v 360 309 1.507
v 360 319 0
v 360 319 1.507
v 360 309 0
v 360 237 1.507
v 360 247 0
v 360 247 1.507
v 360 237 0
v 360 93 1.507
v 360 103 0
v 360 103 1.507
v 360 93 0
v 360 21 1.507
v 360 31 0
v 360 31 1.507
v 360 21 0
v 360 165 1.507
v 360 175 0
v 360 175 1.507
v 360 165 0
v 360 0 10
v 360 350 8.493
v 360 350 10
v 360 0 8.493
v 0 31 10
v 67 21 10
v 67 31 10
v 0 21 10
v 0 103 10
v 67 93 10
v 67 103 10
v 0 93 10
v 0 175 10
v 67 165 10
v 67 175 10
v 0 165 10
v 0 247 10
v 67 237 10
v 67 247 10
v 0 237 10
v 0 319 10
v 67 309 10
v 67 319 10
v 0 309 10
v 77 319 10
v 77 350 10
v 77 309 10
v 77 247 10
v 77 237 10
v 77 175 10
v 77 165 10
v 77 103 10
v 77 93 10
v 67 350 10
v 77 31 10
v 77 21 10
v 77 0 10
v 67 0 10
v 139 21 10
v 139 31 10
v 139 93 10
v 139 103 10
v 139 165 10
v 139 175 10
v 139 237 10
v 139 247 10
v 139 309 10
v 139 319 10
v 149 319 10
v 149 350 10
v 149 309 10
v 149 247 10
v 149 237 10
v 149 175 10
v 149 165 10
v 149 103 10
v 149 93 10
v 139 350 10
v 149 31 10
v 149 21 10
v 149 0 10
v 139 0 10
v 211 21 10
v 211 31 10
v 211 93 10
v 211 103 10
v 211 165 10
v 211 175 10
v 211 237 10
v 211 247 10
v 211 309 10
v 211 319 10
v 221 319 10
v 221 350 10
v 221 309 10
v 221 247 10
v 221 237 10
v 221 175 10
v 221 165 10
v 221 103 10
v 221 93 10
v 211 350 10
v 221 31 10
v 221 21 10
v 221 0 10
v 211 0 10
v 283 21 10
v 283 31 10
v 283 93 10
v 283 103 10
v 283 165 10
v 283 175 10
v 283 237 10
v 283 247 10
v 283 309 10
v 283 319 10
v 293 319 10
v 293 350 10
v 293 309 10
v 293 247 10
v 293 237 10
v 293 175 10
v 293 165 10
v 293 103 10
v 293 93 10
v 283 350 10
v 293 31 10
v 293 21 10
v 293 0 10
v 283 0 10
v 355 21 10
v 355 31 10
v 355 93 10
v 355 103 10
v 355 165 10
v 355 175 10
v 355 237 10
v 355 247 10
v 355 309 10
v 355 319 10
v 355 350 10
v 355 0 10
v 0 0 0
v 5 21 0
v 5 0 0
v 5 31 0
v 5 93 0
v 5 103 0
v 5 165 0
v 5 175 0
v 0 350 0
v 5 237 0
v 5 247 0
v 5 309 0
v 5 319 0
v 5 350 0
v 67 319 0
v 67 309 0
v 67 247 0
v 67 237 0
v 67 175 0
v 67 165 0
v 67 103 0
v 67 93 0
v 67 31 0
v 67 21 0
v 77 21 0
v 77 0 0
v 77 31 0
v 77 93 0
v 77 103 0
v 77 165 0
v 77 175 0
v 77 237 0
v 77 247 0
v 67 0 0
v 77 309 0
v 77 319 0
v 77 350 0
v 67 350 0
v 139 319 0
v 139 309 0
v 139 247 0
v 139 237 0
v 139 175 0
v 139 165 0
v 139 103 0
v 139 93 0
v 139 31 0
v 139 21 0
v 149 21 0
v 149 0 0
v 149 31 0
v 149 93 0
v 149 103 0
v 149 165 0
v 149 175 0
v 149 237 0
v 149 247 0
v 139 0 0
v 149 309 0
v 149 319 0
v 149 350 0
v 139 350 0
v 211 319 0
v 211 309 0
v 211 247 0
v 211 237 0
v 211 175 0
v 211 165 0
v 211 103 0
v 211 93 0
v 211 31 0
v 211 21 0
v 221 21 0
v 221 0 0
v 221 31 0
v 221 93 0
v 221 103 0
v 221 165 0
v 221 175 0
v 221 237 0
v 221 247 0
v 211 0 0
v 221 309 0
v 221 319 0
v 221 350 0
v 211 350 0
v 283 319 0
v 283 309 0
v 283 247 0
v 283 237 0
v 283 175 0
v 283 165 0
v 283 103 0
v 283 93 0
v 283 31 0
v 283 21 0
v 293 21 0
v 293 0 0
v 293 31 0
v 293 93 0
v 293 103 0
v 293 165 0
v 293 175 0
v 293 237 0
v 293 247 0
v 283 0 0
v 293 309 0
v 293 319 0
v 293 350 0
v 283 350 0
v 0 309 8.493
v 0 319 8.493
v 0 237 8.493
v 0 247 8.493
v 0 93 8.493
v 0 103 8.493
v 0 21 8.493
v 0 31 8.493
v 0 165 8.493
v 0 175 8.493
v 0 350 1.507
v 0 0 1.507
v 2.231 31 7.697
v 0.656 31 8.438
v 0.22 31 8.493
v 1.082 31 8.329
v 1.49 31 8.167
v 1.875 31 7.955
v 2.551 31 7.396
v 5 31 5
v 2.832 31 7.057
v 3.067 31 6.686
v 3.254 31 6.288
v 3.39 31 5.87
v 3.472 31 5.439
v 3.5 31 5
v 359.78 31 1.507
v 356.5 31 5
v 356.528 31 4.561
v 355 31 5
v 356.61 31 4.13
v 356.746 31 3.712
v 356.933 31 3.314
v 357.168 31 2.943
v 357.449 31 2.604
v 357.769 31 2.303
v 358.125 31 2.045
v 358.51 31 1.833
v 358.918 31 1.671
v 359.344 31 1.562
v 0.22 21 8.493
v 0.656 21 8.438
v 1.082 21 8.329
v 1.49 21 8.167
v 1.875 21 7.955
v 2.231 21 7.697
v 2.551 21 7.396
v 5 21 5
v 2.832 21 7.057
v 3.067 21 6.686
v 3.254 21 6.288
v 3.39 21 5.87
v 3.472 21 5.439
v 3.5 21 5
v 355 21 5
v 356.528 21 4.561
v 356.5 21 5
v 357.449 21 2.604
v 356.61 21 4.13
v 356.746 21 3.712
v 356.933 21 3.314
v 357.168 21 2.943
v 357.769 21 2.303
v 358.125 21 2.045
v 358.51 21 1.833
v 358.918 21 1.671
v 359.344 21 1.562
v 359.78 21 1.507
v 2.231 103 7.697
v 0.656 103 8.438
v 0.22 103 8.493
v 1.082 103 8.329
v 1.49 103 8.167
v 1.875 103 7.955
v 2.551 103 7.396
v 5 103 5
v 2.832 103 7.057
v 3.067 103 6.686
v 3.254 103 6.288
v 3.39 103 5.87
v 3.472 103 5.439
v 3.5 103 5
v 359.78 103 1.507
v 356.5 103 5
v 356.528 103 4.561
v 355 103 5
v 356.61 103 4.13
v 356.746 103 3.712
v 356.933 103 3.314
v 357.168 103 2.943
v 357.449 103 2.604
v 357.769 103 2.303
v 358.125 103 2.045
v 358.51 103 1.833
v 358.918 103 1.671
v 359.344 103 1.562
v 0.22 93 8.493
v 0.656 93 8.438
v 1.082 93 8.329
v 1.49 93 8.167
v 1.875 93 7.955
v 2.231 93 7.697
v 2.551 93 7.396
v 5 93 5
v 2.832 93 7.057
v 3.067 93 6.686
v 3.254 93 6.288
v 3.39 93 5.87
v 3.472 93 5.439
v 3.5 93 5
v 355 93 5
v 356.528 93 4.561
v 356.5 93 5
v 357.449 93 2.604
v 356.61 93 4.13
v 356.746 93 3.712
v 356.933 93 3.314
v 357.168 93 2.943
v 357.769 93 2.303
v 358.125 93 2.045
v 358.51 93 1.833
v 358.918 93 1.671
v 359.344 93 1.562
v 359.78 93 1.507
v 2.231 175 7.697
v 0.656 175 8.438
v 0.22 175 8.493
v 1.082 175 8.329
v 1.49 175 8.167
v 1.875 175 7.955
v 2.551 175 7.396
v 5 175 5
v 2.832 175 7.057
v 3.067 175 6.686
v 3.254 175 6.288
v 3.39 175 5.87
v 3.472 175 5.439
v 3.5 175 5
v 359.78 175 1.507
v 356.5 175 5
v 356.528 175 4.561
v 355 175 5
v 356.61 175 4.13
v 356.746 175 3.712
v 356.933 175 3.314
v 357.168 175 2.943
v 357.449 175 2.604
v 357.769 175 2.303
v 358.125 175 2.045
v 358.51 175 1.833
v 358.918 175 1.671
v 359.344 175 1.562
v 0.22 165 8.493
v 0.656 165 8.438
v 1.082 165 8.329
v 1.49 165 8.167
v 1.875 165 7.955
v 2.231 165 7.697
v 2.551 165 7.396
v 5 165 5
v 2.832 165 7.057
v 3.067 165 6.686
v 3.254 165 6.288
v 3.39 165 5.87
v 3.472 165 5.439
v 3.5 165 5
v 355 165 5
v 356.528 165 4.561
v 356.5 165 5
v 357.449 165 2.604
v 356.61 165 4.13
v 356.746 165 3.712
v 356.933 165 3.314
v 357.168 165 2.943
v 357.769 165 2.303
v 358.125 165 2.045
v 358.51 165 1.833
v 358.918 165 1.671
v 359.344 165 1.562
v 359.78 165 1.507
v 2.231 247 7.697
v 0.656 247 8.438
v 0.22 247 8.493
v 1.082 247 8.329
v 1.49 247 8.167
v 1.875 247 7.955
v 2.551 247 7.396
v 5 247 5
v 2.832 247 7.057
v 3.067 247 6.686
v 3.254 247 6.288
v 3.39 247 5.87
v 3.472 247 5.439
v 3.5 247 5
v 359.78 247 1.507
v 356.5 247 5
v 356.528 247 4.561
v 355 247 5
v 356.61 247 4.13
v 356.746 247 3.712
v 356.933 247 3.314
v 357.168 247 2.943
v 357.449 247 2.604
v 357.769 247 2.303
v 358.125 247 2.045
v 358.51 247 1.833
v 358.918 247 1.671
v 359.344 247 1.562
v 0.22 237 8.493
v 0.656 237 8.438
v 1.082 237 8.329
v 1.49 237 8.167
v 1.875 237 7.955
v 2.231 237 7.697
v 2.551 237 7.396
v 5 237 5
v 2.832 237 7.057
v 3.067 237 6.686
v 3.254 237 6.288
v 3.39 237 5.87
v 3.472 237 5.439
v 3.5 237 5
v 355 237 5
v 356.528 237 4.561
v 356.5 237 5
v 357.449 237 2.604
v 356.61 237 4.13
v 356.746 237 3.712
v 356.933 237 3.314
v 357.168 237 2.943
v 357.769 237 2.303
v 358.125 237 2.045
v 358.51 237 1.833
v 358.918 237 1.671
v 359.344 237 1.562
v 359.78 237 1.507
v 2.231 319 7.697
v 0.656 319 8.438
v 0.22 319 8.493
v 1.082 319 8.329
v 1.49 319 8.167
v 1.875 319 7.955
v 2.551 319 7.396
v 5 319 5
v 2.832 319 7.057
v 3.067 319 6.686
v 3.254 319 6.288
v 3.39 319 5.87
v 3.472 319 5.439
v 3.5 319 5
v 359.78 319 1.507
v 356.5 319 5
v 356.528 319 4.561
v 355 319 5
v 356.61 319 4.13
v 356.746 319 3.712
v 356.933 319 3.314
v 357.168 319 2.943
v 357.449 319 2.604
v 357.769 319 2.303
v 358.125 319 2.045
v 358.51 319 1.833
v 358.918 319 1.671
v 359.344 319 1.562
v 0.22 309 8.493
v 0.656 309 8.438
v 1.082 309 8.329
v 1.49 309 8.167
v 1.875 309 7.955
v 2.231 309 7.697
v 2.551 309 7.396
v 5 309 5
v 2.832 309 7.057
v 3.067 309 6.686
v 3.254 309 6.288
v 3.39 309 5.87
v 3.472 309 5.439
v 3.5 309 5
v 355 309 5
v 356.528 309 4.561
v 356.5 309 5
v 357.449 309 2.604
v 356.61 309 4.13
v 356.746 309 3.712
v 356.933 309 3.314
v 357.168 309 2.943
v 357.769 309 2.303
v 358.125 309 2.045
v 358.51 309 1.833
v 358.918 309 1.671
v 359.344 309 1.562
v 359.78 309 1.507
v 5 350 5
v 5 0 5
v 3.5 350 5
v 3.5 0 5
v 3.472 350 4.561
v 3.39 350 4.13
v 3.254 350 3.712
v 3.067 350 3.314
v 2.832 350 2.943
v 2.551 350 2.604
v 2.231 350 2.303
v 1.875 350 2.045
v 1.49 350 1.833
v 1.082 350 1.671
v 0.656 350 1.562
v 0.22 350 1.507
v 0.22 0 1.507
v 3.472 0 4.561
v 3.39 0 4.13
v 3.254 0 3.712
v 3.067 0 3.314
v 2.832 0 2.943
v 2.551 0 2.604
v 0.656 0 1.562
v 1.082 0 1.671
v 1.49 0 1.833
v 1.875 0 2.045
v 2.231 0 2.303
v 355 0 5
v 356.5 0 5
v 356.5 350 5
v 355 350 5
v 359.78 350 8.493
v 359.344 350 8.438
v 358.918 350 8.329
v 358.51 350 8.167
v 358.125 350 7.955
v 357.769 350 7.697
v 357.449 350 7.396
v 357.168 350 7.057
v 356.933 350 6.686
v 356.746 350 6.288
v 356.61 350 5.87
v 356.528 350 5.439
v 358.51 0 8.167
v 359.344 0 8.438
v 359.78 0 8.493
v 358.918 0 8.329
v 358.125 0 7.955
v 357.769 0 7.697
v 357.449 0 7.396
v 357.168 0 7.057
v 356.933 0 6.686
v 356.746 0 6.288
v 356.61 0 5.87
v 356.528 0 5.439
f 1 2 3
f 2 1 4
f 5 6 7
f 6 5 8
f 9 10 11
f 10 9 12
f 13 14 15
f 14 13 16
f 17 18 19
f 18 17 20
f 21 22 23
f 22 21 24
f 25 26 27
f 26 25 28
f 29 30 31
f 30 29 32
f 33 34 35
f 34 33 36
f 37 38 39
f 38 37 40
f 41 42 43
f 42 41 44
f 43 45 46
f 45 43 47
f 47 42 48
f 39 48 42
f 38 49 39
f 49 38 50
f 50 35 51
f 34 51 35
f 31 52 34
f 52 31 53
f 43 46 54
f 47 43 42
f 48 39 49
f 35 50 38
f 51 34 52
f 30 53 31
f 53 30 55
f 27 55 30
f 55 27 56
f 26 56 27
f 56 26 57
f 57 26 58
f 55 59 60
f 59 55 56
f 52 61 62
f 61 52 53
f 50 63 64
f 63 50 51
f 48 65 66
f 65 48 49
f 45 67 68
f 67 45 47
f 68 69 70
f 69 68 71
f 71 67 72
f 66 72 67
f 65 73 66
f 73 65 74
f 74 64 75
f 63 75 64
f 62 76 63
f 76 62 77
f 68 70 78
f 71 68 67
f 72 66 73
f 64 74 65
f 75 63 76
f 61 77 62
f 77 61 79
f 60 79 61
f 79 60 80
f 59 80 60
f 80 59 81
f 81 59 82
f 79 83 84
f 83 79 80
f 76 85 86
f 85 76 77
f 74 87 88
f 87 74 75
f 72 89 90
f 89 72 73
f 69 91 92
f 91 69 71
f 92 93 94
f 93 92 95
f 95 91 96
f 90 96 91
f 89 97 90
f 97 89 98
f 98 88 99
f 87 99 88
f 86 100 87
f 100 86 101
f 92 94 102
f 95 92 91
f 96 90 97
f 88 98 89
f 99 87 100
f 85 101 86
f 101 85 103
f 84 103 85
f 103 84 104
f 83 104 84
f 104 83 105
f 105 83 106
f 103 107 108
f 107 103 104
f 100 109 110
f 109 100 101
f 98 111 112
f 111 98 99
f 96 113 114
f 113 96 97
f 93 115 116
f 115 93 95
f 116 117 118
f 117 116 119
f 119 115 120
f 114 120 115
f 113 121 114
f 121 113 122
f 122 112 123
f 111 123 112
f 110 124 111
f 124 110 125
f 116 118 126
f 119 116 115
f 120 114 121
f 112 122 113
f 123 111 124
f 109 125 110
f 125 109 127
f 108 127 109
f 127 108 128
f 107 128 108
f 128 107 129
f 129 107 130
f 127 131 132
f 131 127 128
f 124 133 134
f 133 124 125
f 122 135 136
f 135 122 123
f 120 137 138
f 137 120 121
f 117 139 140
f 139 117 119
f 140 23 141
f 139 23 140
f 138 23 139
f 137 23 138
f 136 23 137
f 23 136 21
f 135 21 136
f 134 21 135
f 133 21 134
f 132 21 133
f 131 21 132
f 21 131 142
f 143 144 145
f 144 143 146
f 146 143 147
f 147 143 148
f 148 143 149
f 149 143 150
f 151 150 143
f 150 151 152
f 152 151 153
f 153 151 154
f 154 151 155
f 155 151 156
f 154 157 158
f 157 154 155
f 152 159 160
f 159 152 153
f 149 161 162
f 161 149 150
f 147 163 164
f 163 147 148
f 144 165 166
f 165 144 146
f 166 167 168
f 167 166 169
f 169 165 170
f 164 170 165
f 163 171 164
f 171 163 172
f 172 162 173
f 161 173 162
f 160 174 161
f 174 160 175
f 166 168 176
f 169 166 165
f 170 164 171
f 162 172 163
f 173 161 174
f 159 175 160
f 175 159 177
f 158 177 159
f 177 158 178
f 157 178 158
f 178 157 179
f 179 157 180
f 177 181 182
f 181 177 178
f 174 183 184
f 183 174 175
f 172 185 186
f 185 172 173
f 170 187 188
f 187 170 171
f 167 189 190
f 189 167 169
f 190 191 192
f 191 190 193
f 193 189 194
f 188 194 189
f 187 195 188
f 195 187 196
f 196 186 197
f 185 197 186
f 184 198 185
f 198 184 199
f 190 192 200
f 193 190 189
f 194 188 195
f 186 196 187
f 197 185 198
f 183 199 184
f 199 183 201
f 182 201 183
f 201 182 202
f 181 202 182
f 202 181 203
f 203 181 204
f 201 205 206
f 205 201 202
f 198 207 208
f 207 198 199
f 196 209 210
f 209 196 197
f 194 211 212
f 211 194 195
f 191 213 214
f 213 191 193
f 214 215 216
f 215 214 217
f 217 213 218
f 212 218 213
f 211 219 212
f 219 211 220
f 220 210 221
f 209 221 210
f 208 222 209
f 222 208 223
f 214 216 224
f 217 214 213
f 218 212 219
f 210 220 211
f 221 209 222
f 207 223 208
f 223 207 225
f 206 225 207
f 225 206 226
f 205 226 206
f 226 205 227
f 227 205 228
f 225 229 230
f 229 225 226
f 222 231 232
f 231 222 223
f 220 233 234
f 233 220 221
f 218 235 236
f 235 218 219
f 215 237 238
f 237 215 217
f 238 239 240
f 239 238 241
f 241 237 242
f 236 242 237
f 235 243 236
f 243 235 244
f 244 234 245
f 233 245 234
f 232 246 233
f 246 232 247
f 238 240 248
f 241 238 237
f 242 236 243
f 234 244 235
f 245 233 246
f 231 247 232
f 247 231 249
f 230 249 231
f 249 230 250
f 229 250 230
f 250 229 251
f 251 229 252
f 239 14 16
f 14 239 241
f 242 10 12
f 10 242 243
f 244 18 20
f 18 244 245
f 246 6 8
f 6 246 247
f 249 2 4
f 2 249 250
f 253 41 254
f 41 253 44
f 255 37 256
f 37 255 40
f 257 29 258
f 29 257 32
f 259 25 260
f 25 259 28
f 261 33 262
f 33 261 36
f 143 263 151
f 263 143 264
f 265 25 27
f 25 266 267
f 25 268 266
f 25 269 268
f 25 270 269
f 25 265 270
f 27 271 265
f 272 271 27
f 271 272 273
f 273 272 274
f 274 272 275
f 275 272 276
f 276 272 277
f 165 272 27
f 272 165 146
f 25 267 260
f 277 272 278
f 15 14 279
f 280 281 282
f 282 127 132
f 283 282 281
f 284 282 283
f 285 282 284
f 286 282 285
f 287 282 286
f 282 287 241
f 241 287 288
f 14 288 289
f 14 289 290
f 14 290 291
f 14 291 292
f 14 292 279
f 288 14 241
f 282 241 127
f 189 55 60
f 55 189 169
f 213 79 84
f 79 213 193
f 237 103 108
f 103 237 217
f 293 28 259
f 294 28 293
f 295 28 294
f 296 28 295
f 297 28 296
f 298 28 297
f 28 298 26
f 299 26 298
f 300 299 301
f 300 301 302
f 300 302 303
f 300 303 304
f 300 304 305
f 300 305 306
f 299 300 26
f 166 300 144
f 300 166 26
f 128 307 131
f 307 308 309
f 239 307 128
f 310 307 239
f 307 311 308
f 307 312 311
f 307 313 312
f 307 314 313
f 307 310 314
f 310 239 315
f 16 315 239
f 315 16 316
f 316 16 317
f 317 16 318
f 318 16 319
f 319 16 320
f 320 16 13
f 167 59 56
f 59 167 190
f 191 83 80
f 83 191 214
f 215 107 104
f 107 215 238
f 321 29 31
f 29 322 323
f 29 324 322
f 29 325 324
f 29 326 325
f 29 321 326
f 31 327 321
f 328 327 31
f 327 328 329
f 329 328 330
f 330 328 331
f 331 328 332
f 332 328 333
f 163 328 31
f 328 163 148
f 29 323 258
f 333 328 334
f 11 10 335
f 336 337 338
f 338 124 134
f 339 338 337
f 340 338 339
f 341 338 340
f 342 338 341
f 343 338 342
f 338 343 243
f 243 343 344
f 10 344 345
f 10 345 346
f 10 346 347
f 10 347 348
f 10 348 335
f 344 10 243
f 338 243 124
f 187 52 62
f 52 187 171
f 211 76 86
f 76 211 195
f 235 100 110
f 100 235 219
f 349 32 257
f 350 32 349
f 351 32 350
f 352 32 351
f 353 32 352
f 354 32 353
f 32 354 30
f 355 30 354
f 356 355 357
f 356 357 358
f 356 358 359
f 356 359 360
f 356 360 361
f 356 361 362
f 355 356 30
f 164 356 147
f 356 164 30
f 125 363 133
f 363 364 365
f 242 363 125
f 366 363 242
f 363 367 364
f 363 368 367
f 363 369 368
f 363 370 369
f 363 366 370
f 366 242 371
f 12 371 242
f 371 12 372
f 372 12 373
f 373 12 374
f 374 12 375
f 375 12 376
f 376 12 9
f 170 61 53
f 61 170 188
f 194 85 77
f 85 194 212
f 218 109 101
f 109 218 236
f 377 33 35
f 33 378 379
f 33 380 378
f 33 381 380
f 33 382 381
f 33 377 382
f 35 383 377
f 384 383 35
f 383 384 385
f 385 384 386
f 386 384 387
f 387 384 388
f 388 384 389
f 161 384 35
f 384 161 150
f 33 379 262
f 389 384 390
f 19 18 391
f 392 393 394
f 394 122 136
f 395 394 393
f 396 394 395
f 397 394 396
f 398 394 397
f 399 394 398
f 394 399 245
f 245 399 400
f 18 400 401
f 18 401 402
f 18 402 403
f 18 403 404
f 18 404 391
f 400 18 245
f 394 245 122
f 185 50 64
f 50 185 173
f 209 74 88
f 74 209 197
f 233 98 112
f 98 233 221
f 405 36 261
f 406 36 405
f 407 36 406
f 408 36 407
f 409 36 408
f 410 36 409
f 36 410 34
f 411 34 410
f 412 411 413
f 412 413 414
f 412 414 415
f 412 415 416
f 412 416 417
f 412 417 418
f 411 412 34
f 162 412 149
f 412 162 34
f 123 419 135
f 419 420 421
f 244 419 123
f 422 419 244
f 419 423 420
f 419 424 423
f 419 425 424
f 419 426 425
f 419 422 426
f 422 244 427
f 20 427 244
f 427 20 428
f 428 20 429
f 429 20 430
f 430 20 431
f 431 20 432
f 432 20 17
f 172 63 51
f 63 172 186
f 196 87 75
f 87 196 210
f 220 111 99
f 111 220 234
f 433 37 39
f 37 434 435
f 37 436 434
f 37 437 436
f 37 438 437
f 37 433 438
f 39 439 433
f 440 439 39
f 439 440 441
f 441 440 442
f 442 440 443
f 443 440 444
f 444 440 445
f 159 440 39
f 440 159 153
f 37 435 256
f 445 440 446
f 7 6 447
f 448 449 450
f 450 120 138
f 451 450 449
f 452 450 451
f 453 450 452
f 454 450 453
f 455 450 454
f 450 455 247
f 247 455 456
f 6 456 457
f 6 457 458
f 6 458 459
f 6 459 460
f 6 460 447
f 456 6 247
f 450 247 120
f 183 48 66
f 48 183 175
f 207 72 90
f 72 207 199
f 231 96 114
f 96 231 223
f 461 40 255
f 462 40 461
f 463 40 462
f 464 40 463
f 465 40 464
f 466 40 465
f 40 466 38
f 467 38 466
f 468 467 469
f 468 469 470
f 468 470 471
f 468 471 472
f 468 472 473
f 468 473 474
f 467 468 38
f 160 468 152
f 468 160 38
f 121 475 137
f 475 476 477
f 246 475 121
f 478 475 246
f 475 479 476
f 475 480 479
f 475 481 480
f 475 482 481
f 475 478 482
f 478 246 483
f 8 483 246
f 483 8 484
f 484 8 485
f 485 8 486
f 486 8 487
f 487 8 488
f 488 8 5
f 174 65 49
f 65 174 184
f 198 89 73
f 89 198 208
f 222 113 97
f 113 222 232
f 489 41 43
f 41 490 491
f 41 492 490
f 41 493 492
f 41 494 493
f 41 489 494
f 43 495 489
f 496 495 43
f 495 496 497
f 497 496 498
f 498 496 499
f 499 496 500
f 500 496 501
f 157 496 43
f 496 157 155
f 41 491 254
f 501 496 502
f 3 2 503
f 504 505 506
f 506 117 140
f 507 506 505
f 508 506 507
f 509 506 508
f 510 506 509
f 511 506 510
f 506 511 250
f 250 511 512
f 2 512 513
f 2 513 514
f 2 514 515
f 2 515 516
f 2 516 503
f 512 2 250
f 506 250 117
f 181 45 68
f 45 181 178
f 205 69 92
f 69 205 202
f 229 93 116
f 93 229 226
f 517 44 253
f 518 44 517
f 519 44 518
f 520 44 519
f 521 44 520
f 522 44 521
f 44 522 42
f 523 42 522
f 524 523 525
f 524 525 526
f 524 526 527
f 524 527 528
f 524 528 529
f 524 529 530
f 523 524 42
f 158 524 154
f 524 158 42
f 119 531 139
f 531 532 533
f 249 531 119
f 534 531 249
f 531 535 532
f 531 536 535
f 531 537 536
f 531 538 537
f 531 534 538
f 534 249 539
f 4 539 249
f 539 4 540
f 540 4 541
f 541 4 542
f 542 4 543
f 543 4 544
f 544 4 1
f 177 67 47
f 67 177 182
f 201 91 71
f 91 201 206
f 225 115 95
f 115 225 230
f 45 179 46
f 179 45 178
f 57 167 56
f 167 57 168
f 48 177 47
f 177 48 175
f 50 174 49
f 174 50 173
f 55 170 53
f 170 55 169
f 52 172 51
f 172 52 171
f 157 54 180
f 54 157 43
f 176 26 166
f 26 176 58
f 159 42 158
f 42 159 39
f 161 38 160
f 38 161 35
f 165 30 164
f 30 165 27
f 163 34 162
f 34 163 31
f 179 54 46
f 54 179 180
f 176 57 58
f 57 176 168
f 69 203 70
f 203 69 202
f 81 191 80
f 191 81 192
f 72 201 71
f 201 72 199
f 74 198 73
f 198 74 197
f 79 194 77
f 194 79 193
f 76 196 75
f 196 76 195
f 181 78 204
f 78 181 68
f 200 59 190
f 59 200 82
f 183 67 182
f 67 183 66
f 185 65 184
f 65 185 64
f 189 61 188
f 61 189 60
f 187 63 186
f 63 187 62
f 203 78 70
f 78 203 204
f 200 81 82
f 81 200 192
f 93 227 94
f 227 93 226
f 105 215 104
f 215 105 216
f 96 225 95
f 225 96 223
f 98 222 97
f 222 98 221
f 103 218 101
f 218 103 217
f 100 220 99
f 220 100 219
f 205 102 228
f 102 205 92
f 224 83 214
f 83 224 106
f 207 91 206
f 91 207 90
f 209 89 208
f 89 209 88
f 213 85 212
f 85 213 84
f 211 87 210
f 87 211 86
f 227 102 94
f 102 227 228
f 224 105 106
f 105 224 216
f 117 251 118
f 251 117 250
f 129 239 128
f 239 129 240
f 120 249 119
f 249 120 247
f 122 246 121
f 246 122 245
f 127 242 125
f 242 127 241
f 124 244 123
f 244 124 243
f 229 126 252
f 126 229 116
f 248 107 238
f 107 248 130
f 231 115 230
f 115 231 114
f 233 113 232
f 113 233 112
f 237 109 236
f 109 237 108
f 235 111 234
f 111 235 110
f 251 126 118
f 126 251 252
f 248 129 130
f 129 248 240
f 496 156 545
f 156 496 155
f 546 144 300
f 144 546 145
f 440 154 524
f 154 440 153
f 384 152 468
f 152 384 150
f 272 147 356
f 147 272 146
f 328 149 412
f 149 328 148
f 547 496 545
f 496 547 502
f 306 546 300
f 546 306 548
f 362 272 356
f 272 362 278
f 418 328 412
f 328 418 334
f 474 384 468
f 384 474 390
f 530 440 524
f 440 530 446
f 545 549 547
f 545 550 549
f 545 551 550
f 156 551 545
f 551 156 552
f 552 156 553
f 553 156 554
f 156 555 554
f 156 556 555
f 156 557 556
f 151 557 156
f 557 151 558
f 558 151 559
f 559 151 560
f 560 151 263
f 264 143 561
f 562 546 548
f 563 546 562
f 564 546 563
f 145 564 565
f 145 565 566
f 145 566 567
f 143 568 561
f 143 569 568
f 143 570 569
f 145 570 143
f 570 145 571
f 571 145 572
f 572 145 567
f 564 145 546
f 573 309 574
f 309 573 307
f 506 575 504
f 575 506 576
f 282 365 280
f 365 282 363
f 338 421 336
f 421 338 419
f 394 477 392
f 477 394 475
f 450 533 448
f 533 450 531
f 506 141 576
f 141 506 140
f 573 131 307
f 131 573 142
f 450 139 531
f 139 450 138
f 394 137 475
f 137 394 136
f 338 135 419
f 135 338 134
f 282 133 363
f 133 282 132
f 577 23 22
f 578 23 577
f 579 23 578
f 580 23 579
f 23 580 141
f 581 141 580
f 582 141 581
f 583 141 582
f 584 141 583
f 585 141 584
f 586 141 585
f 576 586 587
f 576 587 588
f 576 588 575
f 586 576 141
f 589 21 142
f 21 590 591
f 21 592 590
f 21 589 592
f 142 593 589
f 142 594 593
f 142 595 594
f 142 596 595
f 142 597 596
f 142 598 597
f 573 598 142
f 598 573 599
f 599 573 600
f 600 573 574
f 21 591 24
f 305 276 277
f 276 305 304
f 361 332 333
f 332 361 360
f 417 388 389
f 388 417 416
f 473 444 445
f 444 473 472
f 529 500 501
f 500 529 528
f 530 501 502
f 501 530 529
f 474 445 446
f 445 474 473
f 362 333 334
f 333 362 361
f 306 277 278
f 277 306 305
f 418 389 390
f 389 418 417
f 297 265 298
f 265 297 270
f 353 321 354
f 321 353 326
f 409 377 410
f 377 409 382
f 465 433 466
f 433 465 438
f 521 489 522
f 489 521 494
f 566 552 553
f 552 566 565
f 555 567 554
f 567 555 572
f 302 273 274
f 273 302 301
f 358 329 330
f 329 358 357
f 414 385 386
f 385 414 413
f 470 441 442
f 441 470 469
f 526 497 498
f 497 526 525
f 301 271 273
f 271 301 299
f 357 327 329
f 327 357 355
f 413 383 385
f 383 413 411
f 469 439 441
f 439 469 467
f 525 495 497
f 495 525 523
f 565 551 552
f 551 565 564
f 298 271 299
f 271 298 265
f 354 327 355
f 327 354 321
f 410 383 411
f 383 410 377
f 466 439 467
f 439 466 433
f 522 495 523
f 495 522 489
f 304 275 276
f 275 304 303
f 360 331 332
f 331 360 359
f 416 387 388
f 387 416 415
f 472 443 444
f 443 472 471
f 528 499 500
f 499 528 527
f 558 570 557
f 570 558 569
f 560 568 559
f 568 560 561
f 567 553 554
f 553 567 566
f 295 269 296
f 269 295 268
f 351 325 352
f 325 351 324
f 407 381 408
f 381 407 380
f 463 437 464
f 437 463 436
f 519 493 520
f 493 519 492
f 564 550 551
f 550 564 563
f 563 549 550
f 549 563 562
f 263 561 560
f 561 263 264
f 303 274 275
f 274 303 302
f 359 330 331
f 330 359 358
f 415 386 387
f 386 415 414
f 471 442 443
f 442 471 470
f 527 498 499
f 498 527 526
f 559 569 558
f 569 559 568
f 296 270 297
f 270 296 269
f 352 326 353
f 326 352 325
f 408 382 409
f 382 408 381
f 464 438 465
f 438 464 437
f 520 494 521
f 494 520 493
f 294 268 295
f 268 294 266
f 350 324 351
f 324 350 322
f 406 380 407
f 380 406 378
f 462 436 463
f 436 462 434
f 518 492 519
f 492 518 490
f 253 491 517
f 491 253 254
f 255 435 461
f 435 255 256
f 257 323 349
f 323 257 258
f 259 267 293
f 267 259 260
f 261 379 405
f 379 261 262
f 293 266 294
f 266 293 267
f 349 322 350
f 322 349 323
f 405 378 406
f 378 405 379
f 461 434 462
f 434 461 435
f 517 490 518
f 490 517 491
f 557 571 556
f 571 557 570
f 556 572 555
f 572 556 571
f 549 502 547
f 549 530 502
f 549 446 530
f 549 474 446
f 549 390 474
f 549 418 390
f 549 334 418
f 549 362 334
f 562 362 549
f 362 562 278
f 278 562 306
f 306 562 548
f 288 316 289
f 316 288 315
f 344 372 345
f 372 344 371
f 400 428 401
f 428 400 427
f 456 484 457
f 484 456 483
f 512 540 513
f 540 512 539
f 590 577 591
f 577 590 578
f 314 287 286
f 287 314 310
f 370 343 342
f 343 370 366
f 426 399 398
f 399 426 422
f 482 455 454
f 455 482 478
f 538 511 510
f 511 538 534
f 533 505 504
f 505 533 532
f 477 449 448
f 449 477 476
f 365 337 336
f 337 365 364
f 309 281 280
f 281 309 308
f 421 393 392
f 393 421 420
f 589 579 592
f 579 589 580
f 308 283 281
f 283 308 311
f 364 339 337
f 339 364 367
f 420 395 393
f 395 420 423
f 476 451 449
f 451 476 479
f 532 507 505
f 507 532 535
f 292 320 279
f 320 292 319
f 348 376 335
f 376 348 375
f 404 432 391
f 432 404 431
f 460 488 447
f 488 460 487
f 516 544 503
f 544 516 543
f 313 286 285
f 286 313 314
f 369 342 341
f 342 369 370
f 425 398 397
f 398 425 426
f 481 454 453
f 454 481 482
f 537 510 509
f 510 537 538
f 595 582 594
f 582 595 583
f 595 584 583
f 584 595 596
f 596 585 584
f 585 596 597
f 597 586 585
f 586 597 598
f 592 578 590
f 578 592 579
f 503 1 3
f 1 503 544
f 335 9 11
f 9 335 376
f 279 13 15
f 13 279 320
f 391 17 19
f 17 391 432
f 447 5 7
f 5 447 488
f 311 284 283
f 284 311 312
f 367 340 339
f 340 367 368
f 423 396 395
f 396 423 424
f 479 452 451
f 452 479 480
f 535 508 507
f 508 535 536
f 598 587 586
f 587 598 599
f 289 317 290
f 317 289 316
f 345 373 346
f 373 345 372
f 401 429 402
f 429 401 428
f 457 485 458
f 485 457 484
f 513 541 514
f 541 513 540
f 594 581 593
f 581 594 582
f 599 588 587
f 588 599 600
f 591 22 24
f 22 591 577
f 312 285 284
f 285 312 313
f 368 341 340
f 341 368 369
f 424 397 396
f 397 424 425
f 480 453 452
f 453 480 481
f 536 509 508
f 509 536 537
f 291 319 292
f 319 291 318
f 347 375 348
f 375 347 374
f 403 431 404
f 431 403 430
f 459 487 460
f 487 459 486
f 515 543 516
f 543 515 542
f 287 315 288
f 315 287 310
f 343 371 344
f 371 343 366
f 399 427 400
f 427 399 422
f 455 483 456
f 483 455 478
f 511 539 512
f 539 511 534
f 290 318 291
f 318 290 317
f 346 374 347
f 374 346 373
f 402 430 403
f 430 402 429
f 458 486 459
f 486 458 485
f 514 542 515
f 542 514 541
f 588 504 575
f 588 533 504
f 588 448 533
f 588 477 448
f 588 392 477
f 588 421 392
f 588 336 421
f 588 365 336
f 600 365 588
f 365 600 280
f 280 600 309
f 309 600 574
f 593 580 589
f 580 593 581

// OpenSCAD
difference() {
union() {
translate([67,0,0]) cube([10,350,10]);
translate([139,0,0]) cube([10,350,10]);
translate([211,0,0]) cube([10,350,10]);
translate([283,0,0]) cube([10,350,10]);
h = [26,98,170,242,314];
for (c = h) {
translate([0, c-5,0]) cube([360,10,10]);
}
translate([0,0,0]) cube([5,350,5]);
translate([355,0,5]) cube([5,350,5]);
}
// adjust for left wall grooves
intersection() {
translate([0,175,5]) rotate([90,0,0]) cylinder(h=352, r=3.5, $fn=50, center=true);
translate([-1,0,0]) cube([10,350,10]);
}
// right
intersection() {
translate([360,175,5]) rotate([90,0,0]) cylinder(h=352, r=3.5, $fn=50, center=true);
translate([355,0,0]) cube([10,350,10]);
}
}
